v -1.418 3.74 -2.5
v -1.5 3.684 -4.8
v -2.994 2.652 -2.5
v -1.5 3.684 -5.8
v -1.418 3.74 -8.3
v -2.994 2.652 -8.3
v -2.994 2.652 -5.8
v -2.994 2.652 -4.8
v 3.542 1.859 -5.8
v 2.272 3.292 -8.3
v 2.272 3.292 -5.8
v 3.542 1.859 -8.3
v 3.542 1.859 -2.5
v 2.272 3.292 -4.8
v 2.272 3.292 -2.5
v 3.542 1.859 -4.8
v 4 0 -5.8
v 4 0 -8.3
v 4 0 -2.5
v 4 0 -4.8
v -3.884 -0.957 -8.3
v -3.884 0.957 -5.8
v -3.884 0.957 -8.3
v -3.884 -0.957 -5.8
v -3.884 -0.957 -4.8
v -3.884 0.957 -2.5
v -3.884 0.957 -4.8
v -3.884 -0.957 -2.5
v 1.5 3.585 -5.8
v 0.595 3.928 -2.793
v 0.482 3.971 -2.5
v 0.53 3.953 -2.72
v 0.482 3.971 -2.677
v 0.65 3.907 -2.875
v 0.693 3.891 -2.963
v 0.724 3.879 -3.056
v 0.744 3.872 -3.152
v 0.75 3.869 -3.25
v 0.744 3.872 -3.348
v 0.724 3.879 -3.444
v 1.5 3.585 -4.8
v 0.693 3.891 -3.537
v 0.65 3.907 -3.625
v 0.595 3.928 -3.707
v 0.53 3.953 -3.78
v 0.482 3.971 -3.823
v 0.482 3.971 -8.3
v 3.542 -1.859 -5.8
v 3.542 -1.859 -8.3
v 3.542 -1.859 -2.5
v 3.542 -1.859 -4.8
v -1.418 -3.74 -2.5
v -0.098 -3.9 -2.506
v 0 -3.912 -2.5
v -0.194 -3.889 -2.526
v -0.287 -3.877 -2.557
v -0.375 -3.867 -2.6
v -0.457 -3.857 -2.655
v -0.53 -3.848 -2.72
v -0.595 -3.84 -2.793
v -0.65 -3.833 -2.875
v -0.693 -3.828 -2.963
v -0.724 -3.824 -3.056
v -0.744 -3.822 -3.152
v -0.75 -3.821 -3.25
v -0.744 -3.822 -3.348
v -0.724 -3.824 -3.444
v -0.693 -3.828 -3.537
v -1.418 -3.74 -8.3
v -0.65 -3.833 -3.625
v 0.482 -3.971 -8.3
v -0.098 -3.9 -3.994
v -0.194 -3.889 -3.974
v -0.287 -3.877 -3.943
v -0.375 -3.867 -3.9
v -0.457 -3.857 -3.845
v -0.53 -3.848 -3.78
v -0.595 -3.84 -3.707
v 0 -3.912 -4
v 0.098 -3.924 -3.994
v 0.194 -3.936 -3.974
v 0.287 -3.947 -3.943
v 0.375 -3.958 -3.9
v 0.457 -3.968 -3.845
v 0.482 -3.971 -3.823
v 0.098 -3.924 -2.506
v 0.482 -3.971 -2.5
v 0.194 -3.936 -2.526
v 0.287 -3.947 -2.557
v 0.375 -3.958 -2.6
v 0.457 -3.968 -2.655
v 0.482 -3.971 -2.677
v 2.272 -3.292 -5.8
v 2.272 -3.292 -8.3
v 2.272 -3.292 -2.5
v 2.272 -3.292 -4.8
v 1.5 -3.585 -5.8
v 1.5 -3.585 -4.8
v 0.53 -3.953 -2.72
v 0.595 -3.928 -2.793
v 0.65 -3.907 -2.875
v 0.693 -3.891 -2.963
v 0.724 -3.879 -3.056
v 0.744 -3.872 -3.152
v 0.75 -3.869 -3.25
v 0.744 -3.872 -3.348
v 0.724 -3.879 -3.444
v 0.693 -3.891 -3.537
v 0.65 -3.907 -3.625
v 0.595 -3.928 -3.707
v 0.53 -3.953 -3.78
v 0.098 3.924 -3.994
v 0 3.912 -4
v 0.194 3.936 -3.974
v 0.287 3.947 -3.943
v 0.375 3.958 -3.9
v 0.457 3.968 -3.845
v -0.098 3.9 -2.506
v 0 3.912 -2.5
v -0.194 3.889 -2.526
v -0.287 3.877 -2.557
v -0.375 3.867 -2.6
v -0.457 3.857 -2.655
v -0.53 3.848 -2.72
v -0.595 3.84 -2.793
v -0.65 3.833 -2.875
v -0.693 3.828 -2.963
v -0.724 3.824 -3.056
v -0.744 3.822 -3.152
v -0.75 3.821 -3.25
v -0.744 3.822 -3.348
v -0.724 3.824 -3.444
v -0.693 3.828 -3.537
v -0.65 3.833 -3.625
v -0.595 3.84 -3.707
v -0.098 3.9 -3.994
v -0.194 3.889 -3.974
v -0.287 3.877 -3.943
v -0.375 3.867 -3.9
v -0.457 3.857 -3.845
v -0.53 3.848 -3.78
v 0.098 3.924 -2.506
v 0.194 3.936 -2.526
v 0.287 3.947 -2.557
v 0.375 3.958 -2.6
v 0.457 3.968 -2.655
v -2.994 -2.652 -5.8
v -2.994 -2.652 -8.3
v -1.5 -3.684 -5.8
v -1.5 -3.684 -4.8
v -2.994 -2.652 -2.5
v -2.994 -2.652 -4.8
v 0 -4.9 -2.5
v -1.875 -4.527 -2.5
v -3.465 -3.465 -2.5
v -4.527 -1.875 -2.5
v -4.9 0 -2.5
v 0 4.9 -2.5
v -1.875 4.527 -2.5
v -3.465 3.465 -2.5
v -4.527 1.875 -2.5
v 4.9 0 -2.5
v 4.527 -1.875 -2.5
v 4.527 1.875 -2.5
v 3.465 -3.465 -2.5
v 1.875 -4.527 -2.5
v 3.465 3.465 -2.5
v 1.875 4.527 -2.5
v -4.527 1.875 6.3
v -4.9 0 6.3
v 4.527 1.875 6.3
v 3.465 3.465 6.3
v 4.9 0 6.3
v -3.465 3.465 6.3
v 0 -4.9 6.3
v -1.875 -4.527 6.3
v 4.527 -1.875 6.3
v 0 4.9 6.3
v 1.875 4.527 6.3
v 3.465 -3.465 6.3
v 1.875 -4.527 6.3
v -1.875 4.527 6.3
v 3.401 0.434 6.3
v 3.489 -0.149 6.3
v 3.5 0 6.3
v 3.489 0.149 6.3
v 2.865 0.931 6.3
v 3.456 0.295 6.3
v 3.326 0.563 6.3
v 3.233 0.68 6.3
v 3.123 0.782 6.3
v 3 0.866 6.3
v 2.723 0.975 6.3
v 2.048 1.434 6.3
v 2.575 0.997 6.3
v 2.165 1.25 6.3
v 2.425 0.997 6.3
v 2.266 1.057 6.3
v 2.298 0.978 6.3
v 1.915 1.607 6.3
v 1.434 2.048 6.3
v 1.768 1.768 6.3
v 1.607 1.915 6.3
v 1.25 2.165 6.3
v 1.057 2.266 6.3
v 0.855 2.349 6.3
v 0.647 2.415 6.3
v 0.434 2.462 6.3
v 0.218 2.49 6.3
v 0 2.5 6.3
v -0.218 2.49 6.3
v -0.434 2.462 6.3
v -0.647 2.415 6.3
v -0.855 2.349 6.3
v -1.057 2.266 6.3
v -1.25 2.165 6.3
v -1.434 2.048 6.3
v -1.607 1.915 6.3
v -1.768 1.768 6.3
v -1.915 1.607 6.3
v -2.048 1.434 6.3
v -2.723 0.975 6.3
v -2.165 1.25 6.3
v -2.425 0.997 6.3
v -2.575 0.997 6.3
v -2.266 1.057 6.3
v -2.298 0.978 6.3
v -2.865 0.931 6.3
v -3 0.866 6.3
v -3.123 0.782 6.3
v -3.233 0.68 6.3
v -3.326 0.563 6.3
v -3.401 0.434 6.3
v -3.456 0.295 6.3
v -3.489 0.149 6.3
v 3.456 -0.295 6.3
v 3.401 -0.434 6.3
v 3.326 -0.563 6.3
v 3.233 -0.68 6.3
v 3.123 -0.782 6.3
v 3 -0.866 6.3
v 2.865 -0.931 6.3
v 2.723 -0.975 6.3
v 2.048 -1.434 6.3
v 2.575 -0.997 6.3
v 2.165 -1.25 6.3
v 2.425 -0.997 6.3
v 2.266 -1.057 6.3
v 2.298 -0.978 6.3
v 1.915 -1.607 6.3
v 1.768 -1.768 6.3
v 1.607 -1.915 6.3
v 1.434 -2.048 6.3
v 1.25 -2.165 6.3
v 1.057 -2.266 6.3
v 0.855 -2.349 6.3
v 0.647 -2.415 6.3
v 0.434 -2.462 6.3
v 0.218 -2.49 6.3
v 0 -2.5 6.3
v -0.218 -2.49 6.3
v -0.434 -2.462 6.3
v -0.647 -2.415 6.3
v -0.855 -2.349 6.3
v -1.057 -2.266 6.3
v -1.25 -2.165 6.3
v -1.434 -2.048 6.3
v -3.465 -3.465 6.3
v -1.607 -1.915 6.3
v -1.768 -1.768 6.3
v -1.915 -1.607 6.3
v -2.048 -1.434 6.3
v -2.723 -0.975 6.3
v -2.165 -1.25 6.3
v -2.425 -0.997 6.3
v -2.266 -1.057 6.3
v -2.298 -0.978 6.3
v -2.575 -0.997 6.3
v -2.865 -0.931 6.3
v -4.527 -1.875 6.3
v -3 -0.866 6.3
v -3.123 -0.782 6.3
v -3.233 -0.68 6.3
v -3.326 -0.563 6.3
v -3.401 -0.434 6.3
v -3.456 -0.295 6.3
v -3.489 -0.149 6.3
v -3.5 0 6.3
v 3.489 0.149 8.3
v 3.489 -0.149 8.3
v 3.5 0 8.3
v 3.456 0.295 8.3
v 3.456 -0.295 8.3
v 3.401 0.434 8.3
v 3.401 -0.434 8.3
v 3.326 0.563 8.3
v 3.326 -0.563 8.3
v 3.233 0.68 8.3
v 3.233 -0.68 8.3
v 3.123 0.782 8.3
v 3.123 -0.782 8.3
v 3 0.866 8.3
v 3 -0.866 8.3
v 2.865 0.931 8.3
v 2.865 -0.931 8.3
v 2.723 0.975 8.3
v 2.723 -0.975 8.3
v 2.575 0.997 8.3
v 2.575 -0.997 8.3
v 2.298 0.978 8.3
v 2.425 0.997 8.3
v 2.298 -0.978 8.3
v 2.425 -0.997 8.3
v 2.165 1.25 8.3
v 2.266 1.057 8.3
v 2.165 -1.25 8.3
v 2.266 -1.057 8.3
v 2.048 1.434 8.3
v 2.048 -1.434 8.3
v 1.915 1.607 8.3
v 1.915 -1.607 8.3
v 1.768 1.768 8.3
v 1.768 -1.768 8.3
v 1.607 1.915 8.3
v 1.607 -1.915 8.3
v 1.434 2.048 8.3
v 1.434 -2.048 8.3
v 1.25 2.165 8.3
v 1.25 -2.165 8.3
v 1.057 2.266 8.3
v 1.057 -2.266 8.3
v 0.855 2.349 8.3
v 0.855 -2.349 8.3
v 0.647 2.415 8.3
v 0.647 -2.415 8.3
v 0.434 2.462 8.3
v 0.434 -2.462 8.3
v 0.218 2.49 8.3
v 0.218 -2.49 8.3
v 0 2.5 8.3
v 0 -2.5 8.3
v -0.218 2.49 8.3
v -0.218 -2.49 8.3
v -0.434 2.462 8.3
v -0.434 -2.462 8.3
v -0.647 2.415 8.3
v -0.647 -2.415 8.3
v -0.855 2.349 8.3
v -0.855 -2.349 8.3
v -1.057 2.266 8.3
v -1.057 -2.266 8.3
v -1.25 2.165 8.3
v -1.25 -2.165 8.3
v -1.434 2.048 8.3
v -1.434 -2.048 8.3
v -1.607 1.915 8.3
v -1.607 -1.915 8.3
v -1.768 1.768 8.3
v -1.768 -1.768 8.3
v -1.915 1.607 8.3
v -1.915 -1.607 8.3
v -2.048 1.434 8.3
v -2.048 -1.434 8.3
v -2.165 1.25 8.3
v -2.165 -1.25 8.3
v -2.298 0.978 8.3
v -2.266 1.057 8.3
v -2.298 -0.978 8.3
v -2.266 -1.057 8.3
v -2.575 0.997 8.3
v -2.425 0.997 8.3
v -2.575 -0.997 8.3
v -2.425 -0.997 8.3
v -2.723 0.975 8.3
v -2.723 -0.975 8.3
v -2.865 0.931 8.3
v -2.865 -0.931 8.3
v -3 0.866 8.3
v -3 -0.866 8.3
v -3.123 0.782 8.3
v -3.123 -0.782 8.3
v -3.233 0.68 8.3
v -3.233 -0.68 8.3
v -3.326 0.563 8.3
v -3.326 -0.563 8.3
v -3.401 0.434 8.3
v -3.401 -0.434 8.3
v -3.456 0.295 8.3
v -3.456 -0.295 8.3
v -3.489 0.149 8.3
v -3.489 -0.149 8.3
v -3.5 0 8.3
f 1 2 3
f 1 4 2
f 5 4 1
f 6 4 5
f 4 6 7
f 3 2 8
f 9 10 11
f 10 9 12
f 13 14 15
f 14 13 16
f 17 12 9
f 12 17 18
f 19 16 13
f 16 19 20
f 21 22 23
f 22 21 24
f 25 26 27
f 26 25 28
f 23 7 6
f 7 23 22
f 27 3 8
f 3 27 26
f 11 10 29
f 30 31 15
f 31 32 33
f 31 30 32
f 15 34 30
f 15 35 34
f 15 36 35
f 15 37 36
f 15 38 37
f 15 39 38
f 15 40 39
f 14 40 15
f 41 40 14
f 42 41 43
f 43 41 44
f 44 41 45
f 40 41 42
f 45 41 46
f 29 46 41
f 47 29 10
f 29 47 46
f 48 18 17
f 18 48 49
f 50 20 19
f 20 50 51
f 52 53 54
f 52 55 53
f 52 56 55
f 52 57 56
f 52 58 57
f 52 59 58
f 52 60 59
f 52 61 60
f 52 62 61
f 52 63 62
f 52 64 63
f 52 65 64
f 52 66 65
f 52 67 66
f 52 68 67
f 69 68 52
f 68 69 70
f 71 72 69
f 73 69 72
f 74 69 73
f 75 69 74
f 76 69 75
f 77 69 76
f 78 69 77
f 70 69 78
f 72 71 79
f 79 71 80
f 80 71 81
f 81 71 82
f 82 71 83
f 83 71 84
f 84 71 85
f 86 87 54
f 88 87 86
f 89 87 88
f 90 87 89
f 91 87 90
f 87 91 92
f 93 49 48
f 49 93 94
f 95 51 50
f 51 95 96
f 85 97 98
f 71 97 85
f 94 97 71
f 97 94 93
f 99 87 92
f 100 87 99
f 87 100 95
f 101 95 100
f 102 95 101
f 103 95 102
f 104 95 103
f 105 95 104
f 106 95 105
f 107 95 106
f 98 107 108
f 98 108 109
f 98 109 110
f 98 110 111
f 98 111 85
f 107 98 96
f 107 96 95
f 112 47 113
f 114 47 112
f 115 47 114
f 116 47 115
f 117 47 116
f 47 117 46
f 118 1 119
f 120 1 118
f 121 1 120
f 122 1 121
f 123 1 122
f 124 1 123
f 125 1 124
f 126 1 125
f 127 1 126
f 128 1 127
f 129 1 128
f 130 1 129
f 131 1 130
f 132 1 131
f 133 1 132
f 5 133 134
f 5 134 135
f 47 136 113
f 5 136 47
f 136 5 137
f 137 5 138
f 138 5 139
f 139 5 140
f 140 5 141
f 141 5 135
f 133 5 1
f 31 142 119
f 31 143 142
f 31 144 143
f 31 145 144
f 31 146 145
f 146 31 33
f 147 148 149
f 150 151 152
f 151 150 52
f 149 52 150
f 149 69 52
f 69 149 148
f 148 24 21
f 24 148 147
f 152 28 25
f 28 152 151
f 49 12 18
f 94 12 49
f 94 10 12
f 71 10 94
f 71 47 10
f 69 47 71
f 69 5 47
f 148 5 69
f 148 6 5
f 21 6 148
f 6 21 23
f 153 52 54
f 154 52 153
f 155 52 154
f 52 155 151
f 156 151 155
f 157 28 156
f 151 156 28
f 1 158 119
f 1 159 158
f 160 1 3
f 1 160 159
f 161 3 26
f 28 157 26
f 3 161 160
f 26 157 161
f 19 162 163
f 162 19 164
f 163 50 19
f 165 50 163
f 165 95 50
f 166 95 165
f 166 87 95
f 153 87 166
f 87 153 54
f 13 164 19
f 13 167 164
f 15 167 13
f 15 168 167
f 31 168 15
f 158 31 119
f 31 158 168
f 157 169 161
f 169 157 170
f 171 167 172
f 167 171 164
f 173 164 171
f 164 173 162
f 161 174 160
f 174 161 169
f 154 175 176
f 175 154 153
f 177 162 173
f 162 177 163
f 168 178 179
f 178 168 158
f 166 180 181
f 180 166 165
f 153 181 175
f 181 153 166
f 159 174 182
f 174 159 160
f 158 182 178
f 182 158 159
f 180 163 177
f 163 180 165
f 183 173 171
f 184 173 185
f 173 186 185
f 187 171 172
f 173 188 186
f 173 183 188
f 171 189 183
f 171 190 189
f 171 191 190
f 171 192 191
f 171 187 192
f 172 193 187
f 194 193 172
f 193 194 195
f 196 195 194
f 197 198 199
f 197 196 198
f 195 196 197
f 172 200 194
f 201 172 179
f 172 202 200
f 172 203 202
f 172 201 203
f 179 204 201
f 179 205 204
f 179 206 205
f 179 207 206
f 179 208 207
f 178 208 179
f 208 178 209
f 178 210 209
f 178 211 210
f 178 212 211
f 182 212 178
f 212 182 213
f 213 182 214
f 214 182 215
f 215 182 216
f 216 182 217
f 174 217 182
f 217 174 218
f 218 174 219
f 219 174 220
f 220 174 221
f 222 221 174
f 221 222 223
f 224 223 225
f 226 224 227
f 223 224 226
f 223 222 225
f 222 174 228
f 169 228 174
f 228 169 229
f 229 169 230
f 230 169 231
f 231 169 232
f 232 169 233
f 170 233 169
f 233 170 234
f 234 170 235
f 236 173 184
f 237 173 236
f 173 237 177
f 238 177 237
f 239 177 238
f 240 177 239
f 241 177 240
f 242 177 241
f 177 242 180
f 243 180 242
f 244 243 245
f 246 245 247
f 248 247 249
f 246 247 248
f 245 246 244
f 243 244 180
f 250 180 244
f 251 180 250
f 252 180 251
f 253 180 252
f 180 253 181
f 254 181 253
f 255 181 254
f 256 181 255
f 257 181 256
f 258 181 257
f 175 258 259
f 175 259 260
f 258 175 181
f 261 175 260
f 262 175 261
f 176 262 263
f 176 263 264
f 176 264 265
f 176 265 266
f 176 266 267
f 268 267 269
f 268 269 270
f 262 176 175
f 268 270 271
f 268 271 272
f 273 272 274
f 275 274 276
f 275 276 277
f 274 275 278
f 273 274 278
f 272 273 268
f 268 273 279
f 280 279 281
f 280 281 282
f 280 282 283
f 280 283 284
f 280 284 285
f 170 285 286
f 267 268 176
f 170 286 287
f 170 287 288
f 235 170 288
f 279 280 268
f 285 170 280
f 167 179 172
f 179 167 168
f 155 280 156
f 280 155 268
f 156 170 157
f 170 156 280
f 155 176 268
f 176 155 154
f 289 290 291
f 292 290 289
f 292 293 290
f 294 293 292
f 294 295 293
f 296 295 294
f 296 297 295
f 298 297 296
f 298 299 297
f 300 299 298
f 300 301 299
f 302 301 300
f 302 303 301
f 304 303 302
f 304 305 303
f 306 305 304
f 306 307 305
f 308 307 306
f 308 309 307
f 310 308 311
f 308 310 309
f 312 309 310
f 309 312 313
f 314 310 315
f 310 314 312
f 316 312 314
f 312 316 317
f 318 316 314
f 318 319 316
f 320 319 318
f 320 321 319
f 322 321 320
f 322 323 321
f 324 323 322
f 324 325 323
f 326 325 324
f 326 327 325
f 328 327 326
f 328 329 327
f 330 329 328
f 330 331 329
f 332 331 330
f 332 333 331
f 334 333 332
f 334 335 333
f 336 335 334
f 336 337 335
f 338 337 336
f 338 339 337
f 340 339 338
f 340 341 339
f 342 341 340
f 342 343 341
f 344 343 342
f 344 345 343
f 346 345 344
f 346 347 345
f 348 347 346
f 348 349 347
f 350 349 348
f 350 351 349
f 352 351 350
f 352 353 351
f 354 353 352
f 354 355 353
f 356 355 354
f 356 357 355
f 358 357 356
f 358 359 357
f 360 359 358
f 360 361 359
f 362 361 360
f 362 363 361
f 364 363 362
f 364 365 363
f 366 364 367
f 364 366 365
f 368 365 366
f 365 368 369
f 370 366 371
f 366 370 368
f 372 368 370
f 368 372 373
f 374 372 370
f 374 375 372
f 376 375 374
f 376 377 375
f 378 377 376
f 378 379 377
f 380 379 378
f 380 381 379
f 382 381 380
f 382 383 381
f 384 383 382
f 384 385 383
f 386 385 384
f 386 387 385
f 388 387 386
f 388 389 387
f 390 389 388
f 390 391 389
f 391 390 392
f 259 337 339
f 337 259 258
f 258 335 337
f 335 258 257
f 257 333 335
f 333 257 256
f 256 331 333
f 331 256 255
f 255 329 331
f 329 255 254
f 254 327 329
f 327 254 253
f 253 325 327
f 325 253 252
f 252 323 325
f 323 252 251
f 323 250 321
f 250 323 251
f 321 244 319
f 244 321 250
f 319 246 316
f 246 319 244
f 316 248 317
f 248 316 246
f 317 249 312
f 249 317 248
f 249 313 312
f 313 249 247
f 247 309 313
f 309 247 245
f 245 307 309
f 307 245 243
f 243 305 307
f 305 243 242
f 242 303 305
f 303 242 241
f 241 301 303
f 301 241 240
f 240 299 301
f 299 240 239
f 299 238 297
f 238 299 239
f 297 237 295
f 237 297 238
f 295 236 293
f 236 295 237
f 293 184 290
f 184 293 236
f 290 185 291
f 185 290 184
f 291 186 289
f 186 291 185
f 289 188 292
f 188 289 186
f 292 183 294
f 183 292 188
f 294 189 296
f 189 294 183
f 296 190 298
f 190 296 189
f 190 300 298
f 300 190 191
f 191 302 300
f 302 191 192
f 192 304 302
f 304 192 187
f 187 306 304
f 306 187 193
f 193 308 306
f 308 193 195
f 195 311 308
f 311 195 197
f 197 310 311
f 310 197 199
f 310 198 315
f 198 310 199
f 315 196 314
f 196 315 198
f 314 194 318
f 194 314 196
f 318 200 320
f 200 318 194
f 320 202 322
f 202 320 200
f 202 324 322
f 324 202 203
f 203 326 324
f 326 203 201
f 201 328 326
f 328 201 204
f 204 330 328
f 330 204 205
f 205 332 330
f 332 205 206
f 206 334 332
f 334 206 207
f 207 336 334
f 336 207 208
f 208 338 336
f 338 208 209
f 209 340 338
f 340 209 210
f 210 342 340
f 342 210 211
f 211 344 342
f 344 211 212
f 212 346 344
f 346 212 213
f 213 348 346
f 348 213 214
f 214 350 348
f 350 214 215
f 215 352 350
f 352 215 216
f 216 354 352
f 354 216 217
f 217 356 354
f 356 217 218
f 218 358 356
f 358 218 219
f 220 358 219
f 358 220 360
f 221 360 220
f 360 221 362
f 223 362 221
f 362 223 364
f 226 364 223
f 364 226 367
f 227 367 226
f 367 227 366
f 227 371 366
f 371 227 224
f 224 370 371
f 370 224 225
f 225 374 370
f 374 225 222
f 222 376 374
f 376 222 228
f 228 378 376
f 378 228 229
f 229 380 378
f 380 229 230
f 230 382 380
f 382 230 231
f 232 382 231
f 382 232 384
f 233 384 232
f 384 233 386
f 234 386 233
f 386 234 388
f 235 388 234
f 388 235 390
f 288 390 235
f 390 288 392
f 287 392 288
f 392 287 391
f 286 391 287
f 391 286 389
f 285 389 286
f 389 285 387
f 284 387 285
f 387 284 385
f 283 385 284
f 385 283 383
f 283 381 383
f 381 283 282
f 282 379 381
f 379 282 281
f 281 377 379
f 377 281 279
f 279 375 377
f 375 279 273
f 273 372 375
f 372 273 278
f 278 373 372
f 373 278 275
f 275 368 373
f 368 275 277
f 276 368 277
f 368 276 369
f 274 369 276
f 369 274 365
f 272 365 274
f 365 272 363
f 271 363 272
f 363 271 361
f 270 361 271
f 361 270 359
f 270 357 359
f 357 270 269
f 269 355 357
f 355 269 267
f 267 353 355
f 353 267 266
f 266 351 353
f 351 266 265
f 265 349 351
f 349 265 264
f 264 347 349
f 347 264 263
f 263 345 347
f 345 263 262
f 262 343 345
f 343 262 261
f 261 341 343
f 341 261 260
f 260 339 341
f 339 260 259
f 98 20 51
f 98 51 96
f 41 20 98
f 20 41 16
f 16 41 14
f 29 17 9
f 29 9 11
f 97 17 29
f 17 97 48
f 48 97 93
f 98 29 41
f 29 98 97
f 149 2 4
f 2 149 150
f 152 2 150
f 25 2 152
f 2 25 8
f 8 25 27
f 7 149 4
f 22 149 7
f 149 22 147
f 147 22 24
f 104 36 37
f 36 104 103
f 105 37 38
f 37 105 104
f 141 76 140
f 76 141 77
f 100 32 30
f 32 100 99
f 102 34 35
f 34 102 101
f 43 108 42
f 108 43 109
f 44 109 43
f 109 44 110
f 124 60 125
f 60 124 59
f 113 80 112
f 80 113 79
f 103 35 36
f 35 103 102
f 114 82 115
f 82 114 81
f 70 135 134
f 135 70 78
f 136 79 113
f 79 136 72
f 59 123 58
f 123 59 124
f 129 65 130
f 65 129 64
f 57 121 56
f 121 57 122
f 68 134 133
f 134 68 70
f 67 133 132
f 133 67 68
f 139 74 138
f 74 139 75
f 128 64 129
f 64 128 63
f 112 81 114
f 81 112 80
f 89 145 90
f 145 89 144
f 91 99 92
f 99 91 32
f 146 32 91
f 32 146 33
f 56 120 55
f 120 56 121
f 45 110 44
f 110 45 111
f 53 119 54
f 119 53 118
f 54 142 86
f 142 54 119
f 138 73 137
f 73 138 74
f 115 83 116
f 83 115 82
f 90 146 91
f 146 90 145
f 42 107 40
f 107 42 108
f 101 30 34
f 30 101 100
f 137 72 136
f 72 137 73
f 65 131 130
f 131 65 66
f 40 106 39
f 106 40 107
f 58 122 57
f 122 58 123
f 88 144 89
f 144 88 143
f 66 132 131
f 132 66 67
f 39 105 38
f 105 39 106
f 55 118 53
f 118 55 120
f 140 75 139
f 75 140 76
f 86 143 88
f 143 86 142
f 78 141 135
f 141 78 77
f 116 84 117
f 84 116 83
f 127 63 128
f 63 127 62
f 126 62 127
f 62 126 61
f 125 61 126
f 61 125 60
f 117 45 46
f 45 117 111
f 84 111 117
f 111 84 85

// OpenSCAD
// Part A3: stepped pin with lobed top.
// SPDX-License-Identifier: MIT
//
// Local origin convention:
// - XY origin is the pin axis.
// - Z origin is the part midplane.
// - Assembly placement and animation should be applied outside this file.

module a3_lobed_top_2d(d = 9.8) {
    r_major = d * (2.5 / 9.8); // center R2.5
    r_minor = d * (1.0 / 9.8); // side R1.0 bumps
    side_dx = r_major;         // side bump centers offset from origin

    union() {
        circle(r = r_major, $fn = 72);
        translate([ side_dx, 0]) circle(r = r_minor, $fn = 42);
        translate([-side_dx, 0]) circle(r = r_minor, $fn = 42);
    }
}

module a3_height_ruler(total_h = 16.6, tick_step = 1, major_step = 2, x = 8.5, y = 0) {
    z_min = -total_h / 2;

    // Vertical spine
    color([0.15, 0.15, 0.15])
        translate([x, y, z_min]) cube([0.25, 0.25, total_h], center = false);

    // Tick marks (1 mm minor, 2 mm major)
    for (z = [0 : tick_step : ceil(total_h)]) {
        tick_len = (z % major_step == 0) ? 2.2 : 1.2;
        color([0.05, 0.05, 0.05])
            translate([x - tick_len, y, z_min + z]) cube([tick_len, 0.25, 0.15], center = false);
    }
}

module part_a3(d = 9.8, h = 16.6, show_ruler = false) {
    // Height stack (mm), bottom -> top:
    // 2.5, 1.0, 2.3, 8.8, 2.0  (total = 16.6)
    lower_h = 2.5; // green
    waist_h = 1.0; // red (slot band)
    mid_h   = 2.3; // purple
    upper_h = 8.8; // orange
    top_h   = 2.0; // blue

    z0 = -h / 2;
    z1 = z0 + lower_h;
    z2 = z1 + waist_h;
    // Wide body is positioned from the top:
    // starts 2.0 mm down and runs for 8.8 mm.
    z3 = h / 2 - (top_h + upper_h);
    z4 = h / 2 - top_h;

    waist_d = d * (8.0 / 9.8);     // Ø8.0 region callout
    slot_w = d * (3.0 / 9.8);      // 3.0 slot callout
    hole_d = d * (1.5 / 9.8);      // Ø1.5 cross-hole callout

    difference() {
        union() {
            // Lower stepped stack.
            color("green")
            translate([0, 0, z0]) cylinder(d = waist_d, h = lower_h, center = false);
            color("red")
            translate([0, 0, z1]) cylinder(d = waist_d, h = waist_h, center = false);
            color("purple")
            translate([0, 0, z2]) cylinder(d = waist_d, h = mid_h, center = false);

            // Main wide body (Ø9.8): top-referenced placement.
            color("orange")
            translate([0, 0, z3]) cylinder(d = d, h = upper_h, center = false);

            // Keyed/lobed top boss.
            translate([0, 0, z4]) linear_extrude(height = top_h) a3_lobed_top_2d(d = d);
        }

        // Opposing side slots in lower Ø8.0 section (leave 3.0 mm center web).
        // Slot band matches the full 1.0 mm red section.
        slot_band_h = waist_h;
        slot_band_z = z1;
        half_web = slot_w / 2;
        // +X side slot
        translate([half_web, -waist_d, slot_band_z])
            cube([waist_d, 2 * waist_d, slot_band_h], center = false);
        // -X side slot
        translate([-waist_d - half_web, -waist_d, slot_band_z])
            cube([waist_d, 2 * waist_d, slot_band_h], center = false);

        // Transverse cross-hole (Ø1.5), tangent to top edge of the Ø8.0 band.
        hole_r = hole_d / 2;
        translate([0, 0, z2 + mid_h - hole_r])
            rotate([90, 0, 0])
                cylinder(d = hole_d, h = d + 2.0, center = true, $fn = 48);
    }

    if (show_ruler) {
        a3_height_ruler(total_h = h, x = d * 0.95);
    }
}


// ---- "main guard" ----
// Default to previewing when opened directly:
if (is_undef(__LIB_MODE__)) {
    part_a3(show_ruler = !is_undef(A3_SHOW_RULER) && A3_SHOW_RULER);
}
